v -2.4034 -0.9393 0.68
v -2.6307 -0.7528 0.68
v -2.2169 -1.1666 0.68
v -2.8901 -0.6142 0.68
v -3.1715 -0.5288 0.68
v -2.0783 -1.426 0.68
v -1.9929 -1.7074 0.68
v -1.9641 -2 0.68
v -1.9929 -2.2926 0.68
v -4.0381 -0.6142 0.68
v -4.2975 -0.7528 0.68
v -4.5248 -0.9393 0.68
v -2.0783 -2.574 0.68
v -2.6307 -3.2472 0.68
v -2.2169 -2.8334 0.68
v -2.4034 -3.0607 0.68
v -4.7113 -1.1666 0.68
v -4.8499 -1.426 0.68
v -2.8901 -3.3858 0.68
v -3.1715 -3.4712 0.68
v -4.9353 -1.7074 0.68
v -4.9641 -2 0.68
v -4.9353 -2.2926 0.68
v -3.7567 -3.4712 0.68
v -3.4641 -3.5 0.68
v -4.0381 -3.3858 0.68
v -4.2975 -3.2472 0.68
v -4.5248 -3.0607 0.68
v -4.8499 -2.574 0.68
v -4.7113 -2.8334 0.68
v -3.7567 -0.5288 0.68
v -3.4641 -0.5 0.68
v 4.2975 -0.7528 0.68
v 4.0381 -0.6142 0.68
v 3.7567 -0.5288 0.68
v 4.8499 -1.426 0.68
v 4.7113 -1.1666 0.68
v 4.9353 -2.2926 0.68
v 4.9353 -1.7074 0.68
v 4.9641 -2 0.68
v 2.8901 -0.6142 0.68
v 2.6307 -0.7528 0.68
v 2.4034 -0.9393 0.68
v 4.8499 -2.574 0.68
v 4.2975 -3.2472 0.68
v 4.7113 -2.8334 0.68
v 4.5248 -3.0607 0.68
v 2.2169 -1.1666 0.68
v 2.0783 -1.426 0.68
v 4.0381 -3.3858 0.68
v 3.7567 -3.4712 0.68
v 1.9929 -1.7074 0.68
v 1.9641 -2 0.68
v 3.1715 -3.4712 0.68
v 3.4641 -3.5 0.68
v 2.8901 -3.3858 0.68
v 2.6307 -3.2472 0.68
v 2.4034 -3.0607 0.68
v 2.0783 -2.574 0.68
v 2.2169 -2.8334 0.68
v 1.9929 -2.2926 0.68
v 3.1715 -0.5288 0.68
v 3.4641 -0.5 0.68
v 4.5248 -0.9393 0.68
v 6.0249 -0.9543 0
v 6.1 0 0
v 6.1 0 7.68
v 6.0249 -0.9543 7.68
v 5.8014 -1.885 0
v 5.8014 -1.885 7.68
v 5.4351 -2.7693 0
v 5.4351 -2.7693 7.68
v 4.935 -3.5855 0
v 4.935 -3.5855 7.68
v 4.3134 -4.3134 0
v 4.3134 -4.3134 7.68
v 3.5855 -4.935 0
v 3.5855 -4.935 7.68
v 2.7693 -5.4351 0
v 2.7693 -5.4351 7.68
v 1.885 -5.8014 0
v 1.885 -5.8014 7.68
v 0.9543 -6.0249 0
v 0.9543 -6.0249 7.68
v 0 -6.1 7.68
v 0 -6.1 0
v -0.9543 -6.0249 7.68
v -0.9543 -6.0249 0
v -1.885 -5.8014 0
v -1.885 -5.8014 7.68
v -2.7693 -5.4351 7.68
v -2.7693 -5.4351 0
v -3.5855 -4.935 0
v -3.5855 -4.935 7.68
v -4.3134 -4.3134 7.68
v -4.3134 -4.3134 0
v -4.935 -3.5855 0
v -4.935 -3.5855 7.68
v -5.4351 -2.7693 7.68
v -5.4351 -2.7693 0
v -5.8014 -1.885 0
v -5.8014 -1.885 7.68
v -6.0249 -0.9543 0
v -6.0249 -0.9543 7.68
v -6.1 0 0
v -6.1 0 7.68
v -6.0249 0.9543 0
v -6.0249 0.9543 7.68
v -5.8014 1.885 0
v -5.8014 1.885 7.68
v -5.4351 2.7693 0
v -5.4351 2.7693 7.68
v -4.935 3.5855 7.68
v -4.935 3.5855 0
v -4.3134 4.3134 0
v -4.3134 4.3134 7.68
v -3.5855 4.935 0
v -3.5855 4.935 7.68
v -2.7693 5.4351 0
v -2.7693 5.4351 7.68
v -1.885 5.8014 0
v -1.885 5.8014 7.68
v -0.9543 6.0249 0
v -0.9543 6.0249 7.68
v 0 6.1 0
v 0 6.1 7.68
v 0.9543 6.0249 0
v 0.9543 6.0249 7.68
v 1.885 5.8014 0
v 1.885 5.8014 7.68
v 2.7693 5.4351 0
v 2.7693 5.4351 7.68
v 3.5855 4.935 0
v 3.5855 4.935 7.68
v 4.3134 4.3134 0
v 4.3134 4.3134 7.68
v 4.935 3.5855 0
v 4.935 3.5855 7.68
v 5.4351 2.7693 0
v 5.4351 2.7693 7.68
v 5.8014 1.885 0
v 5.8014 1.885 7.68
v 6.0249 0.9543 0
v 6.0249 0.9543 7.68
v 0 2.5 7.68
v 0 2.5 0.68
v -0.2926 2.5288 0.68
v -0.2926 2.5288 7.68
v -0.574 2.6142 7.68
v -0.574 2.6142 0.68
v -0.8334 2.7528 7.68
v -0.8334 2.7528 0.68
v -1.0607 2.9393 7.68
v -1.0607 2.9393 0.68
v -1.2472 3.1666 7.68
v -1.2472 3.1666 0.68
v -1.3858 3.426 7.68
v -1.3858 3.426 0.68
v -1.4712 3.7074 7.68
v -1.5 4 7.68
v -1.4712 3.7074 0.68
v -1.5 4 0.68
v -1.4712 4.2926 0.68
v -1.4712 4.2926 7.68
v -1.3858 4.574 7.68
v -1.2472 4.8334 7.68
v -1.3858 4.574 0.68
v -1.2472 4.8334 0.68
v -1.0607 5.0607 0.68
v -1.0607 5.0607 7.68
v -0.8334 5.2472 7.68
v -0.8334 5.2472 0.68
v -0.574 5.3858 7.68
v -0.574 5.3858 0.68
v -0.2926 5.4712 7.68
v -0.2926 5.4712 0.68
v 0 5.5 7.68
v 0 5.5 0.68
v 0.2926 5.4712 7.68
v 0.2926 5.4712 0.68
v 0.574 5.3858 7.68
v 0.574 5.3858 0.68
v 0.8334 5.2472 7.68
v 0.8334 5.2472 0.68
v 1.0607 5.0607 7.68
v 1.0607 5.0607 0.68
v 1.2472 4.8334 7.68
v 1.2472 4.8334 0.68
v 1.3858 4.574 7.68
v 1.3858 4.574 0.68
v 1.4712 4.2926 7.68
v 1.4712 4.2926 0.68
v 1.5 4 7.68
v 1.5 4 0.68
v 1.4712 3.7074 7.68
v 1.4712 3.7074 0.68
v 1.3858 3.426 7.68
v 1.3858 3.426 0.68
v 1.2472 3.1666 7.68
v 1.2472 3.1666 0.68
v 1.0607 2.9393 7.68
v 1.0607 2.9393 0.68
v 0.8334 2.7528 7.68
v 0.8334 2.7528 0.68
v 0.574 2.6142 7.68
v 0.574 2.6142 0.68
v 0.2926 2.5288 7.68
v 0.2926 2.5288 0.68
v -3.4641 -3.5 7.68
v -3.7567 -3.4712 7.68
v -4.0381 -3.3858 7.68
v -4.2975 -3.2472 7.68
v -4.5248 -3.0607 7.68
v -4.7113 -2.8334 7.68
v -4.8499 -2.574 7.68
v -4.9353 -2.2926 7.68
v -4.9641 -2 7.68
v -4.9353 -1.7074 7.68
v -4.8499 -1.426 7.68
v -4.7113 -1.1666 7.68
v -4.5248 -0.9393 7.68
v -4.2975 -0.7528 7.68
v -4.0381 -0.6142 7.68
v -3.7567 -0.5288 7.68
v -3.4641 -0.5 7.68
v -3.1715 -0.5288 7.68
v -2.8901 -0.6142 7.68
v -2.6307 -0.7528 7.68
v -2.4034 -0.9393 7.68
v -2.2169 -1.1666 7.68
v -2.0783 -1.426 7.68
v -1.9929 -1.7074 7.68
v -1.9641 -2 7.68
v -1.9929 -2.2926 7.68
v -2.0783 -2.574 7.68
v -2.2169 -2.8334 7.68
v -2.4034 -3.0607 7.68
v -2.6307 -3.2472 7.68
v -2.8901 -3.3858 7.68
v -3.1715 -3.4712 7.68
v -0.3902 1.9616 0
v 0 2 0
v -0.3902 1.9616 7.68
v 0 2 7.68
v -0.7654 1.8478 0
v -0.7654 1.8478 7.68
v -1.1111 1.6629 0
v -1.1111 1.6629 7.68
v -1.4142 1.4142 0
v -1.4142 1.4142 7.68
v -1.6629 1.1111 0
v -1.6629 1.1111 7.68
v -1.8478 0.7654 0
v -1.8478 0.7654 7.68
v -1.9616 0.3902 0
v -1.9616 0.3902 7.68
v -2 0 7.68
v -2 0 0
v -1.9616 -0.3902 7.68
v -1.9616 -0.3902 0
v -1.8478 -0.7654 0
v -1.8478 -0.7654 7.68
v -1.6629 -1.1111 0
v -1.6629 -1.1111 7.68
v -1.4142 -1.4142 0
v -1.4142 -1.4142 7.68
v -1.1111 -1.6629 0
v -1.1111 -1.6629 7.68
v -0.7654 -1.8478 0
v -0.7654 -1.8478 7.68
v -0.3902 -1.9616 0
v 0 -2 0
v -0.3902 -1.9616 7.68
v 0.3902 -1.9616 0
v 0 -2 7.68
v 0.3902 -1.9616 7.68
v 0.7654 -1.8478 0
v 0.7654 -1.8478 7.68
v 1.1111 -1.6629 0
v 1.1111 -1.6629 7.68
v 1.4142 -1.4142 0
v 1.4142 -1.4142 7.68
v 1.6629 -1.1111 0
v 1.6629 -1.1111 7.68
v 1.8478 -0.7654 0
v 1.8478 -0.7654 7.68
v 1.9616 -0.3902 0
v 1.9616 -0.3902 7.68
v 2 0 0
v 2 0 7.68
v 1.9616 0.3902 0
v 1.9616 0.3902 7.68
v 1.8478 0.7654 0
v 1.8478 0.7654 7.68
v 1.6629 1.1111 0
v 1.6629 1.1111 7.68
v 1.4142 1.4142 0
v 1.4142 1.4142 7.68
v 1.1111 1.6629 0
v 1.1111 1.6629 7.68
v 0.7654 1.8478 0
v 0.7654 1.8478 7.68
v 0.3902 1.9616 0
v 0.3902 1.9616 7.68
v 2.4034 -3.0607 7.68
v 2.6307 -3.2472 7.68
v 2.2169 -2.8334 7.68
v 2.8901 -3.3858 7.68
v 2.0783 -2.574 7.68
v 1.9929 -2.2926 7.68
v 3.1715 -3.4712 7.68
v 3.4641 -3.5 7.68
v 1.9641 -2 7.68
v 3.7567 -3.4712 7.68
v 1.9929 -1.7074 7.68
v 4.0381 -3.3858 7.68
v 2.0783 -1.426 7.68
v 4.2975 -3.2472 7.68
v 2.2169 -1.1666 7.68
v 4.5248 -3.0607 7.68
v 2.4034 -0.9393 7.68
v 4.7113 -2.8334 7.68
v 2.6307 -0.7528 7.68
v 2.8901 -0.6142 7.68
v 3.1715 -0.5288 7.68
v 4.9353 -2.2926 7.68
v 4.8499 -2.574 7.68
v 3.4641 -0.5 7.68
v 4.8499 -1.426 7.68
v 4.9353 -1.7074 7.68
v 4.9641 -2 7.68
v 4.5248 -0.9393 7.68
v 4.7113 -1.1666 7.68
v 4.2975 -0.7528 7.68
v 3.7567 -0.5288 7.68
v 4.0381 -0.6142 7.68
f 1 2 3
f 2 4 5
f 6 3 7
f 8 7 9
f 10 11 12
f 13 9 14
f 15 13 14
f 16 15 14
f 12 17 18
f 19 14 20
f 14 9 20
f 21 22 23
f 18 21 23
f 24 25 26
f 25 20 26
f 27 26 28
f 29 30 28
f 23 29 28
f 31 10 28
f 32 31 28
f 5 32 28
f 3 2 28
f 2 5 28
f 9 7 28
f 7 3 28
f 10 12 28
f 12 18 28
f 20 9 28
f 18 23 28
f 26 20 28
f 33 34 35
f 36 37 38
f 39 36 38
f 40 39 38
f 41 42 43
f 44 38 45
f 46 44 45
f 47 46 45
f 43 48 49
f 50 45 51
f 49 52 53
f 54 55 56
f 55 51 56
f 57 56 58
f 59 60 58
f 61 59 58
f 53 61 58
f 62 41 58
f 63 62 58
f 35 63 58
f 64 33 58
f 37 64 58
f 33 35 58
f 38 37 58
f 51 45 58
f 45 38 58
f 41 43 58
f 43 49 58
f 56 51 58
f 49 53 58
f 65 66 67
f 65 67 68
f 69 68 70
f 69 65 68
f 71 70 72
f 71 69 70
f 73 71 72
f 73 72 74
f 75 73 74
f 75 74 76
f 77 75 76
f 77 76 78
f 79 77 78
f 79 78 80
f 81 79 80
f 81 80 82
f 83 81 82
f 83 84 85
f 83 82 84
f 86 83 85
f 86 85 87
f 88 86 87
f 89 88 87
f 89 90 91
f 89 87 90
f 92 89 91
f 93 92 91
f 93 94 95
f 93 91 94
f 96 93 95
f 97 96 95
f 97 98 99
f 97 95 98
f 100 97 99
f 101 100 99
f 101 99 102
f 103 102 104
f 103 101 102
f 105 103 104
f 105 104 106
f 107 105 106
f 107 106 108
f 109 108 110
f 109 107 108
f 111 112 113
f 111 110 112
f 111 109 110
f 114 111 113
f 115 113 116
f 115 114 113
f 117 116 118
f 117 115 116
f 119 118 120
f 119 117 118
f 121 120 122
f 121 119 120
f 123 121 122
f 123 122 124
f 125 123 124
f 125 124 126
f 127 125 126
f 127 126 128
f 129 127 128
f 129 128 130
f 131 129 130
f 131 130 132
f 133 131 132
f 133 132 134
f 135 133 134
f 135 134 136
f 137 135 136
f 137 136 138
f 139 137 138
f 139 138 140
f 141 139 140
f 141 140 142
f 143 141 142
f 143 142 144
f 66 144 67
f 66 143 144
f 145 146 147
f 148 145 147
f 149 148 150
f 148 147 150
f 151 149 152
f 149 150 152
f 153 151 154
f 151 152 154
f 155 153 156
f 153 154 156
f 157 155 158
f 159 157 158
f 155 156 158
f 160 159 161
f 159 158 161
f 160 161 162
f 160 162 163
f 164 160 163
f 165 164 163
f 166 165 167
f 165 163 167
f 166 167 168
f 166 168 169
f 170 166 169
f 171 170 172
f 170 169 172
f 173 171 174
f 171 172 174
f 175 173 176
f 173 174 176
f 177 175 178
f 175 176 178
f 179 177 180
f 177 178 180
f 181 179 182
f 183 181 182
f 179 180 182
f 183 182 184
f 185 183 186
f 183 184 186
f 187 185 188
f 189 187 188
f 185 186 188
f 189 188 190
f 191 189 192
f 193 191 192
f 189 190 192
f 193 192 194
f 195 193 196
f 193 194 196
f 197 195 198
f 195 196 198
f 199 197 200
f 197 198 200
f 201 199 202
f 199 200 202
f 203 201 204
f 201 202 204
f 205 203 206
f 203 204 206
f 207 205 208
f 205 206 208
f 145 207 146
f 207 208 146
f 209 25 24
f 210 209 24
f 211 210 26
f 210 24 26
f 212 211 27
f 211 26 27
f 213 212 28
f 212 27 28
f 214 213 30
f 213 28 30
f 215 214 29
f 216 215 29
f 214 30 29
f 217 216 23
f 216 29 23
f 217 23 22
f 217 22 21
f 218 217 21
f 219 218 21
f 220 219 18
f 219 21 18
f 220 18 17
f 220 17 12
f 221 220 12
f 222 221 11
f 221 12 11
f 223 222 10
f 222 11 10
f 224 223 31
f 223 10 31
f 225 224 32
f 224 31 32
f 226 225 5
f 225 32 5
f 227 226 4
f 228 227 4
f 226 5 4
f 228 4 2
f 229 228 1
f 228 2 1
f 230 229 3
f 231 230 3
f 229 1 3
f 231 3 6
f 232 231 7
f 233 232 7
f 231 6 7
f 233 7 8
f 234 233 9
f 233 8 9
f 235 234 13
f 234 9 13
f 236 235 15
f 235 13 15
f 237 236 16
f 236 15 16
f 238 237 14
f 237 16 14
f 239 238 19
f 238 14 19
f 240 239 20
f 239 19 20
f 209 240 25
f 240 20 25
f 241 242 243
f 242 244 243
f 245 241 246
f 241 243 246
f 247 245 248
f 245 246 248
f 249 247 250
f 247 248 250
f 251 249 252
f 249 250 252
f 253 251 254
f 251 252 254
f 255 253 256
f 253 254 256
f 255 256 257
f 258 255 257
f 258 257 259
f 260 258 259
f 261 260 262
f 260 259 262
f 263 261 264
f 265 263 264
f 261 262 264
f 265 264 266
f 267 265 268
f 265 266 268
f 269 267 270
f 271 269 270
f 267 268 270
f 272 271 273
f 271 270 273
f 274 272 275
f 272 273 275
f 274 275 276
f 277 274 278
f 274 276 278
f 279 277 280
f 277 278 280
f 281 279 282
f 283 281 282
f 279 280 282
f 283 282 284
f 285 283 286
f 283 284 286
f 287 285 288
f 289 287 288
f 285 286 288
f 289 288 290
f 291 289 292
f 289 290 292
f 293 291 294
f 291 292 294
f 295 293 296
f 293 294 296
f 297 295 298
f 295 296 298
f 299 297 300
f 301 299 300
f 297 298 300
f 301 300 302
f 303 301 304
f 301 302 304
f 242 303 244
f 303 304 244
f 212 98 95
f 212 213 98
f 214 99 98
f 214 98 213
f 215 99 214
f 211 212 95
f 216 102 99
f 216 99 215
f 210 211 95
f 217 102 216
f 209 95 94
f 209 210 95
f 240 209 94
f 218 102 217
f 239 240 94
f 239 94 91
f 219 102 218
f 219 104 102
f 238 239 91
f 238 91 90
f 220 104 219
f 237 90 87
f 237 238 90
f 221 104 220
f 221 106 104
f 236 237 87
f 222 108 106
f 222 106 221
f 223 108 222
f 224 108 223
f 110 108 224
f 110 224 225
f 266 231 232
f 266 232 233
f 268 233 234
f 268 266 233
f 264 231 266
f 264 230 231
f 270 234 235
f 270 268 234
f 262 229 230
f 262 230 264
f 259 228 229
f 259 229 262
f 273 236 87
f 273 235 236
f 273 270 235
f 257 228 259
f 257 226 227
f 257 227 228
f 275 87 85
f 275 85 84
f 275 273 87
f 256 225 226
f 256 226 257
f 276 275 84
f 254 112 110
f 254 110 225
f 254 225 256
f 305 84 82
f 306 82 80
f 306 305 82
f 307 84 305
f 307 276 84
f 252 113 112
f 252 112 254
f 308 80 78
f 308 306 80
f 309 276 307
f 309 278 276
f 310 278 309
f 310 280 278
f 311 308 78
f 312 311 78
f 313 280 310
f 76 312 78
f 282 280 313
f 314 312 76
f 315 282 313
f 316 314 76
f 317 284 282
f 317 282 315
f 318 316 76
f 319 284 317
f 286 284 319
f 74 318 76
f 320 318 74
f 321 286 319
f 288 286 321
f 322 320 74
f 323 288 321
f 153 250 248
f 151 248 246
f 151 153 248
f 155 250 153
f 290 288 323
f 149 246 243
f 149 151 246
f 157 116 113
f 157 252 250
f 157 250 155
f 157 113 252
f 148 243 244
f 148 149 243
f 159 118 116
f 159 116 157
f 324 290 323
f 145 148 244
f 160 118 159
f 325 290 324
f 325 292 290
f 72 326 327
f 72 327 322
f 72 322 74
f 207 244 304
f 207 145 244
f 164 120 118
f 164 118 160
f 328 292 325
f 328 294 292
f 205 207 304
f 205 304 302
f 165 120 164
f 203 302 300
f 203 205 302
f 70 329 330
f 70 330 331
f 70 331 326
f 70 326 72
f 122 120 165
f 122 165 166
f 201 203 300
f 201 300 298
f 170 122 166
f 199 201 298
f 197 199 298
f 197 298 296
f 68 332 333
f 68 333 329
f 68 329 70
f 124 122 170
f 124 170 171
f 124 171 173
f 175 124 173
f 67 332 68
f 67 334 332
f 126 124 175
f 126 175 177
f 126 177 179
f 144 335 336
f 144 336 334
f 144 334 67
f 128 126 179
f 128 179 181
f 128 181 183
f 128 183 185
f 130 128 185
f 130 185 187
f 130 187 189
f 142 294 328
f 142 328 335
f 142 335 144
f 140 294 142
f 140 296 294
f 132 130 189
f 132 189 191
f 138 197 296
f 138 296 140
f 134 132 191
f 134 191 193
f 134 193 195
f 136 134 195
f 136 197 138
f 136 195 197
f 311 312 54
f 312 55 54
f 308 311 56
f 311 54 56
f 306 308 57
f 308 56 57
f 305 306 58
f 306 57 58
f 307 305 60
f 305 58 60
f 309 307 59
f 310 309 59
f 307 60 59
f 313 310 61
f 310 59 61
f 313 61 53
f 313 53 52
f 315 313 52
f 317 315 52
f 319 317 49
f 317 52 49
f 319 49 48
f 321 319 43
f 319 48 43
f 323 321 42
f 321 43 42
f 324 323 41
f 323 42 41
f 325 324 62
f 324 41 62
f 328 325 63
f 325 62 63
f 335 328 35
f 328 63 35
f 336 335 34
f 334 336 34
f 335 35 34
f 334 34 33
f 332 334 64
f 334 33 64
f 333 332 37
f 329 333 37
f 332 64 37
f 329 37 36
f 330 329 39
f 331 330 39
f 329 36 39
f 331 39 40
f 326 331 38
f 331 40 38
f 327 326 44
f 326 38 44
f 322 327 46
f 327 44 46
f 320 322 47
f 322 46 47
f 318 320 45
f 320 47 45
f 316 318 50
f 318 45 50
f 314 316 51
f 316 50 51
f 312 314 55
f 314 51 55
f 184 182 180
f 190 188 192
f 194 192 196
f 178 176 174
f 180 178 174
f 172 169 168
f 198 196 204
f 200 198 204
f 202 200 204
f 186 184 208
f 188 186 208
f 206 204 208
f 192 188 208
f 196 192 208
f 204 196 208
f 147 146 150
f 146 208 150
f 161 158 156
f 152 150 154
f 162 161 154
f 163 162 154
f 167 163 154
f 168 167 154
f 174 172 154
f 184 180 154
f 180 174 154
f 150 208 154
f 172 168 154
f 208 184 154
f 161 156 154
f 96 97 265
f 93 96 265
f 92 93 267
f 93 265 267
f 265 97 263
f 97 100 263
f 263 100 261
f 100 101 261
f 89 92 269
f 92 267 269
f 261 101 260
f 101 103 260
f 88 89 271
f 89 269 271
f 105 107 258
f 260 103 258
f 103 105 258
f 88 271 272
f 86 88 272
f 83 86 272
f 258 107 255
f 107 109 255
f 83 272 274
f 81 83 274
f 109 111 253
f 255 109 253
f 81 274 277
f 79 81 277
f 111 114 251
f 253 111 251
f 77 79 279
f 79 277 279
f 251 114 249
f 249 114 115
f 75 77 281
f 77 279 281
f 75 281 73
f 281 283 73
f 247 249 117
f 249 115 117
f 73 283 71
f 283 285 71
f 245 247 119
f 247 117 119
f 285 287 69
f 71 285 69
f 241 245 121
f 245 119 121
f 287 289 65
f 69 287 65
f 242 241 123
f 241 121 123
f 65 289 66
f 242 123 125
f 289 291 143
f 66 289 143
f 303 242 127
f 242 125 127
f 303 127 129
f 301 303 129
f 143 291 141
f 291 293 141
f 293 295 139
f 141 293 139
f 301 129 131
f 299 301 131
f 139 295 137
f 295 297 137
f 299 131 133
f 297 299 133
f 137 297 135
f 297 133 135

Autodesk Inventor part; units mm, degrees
ref_plane "YZ Plane" through (0, 0, 0) normal (1, 0, 0) x (0, 1, 0)
ref_plane "XZ Plane" through (0, 0, 0) normal (0, 1, 0) x (-1, 0, 0)
ref_plane "XY Plane" through (0, 0, 0) normal (0, 0, 1) x (1, 0, 0)
sketch "Sketch1" plane through (0, 0, 0) normal (0, 0, 1) x (1, 0, 0)
  circle A0 centre (0, 0) radius 6.1
  dimension "d0" = 12.2
extrude "Extrusion1" add sketch "Sketch1" along normal blind 7.68
sketch "Sketch2" plane through (0, 0, 7.68) normal (0, 0, 1) x (1, 0, 0)
  circle A0 centre (0, 0) radius 6.1 projected
  line L0 (0, 4) -> (0, 0) construction
  line L1 (0, 0) -> (-3.4641, -2) construction
  line L2 (3.4641, -2) -> (0, 0) construction
  dimension "d3" = 120
  dimension "d4" = 120
  dimension "d5" = 4
hole "Hole1" at (0, 4, 7.68) at (-3.4641, -2, 7.68) at (3.4641, -2, 7.68) direction (0, 0, -1) diameter 3 depth 7
sketch "Sketch3" plane through (0, 0, 0) normal (0, 0, -1) x (-1, 0, 0)
  point P0 (0, 0)
hole "Hole2" at (0, 0, 0) direction (0, 0, 1) diameter 4 end through all
equation "\"d4\" = d3"
properties part number "ScissorPin" material "ABS Plastic"
